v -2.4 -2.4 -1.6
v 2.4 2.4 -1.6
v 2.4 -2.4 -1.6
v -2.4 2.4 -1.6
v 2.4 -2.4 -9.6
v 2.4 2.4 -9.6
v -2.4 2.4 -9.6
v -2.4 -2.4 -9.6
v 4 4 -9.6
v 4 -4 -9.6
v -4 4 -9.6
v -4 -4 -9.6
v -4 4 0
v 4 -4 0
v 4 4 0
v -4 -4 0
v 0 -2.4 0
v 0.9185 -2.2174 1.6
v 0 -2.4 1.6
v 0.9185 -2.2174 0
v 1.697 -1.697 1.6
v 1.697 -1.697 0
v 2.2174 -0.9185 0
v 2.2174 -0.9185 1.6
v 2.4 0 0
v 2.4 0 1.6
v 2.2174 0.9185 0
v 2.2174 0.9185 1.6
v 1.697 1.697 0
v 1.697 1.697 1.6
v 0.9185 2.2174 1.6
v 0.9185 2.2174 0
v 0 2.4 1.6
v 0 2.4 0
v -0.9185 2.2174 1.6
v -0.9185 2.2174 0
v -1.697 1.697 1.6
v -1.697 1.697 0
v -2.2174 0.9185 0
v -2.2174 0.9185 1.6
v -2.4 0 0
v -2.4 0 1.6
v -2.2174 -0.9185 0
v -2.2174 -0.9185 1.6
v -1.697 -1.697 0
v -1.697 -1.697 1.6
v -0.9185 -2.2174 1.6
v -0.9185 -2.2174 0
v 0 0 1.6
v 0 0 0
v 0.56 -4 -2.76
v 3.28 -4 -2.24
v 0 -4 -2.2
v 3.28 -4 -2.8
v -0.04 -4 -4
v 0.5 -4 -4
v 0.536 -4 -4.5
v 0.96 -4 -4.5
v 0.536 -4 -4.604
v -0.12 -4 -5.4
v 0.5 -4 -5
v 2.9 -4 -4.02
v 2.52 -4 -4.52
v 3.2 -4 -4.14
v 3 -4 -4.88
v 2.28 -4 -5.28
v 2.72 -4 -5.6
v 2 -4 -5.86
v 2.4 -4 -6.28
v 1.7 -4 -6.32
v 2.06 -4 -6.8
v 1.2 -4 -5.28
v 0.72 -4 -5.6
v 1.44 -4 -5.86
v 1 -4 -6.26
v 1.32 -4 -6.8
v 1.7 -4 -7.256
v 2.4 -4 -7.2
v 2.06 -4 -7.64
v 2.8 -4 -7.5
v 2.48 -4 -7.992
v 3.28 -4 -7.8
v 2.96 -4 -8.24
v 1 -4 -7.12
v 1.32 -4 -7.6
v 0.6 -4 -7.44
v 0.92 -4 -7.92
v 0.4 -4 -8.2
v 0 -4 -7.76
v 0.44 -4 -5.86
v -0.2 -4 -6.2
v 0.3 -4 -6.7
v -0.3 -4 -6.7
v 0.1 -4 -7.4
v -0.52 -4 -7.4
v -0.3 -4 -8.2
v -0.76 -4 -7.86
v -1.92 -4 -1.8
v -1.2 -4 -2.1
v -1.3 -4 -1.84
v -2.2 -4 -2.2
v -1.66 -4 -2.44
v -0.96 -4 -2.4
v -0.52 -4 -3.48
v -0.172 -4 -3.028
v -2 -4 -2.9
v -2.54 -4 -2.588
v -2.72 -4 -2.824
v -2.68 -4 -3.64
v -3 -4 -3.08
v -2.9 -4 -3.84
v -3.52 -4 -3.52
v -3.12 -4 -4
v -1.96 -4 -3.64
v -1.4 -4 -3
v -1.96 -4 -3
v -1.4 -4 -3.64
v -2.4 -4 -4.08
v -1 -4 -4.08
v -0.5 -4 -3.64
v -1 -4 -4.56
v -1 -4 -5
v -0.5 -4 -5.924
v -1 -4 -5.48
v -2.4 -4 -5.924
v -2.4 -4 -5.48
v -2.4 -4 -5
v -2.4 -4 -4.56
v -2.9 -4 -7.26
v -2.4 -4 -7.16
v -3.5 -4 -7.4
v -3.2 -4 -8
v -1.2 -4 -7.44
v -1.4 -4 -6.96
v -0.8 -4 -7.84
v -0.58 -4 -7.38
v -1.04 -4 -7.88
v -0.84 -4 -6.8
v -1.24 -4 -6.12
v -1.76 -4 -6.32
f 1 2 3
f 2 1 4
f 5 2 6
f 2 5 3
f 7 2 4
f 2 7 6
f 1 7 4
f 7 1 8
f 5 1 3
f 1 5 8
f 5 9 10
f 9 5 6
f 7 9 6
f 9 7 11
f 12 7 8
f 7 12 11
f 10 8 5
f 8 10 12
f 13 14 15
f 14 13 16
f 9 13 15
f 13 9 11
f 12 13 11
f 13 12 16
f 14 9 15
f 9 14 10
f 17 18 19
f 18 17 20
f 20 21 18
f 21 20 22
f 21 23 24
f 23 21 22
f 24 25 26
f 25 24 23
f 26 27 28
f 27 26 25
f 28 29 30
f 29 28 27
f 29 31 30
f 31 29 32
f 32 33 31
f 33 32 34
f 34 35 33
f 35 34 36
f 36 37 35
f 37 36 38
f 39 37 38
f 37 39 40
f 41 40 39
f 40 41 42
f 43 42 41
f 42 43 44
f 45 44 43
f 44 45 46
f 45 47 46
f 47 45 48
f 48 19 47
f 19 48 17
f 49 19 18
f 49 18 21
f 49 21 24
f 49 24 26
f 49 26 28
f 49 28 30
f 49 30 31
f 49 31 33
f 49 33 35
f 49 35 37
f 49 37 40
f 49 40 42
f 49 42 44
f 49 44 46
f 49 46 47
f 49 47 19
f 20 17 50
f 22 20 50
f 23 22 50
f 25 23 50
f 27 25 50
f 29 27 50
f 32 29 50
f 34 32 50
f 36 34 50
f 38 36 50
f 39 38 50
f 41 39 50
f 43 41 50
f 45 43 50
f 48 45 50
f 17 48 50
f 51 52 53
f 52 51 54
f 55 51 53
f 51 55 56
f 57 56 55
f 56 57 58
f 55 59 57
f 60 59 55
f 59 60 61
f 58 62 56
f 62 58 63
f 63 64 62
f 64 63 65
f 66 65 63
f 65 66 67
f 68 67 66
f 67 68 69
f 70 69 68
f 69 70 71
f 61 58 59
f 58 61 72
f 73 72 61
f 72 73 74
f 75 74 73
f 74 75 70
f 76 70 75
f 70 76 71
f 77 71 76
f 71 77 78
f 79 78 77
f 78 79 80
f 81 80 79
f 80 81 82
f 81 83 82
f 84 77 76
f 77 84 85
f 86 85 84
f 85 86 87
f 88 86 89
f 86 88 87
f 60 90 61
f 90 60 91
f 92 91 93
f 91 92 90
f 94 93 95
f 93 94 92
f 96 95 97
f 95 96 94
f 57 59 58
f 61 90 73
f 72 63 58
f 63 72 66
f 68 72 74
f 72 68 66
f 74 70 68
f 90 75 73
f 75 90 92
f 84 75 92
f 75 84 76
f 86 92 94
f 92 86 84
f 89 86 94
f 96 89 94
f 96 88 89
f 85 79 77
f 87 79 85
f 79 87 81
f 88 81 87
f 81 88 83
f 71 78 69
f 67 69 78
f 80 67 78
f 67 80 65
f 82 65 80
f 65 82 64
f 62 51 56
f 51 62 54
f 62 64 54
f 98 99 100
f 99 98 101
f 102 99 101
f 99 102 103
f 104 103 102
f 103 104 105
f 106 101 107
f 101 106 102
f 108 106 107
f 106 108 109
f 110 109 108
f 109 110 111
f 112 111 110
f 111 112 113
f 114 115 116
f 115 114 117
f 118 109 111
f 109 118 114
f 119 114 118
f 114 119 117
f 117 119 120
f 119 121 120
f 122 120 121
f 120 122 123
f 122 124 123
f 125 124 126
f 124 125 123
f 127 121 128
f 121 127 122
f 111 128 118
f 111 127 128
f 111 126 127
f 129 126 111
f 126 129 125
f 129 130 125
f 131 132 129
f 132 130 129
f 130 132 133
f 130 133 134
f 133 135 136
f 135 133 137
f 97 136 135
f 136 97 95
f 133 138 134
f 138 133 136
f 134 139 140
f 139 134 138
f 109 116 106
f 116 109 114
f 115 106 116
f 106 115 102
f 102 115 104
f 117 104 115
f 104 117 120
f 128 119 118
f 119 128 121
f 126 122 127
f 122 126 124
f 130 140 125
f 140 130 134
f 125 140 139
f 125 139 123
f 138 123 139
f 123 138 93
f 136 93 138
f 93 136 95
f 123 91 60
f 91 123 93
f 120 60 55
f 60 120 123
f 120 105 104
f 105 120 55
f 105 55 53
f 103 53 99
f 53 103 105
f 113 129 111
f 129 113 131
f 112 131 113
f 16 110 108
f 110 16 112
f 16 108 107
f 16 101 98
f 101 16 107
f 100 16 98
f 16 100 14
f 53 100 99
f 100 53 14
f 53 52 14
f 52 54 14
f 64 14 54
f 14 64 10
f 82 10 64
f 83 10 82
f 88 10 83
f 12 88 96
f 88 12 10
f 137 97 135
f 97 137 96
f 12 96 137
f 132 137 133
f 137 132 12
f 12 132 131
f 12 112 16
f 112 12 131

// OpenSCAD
// file: ../p/4-4edge.scad
use <../lib.scad>
function ldraw_lib__4_4edge() = [
// 0 Circle 1.0
// 0 Name: 4-4edge.dat
// 0 Author: James Jessiman
// 0 !LDRAW_ORG Primitive UPDATE 2017-01
// 0 !LICENSE Licensed under CC BY 2.0 and CC BY 4.0 : see CAreadme.txt
// 
// 0 BFC CERTIFY CCW
  [0,"BFC","CERTIFY"],
  [0,"BFC","CCW"],
// 
// 0 !HISTORY 1998-12-15 [PTadmin] Official Update 1998-10
// 0 !HISTORY 2005-12-28 [PTadmin] Official Update 2005-01
// 0 !HISTORY 2007-06-24 [PTadmin] Header formatted for Contributor Agreement
// 0 !HISTORY 2008-07-01 [PTadmin] Official Update 2008-01
// 0 !HISTORY 2017-01-15 [Steffen] BFCed
// 0 !HISTORY 2017-12-30 [PTadmin] Official Update 2017-01
// 
// 
// 2 24 1 0 0 0.9239 0 0.3827
  [2,24,1,0,0,0.9239,0,0.3827],
// 2 24 0.9239 0 0.3827 0.7071 0 0.7071
  [2,24,0.9239,0,0.3827,0.7071,0,0.7071],
// 2 24 0.7071 0 0.7071 0.3827 0 0.9239
  [2,24,0.7071,0,0.7071,0.3827,0,0.9239],
// 2 24 0.3827 0 0.9239 0 0 1
  [2,24,0.3827,0,0.9239,0,0,1],
// 2 24 0 0 1 -0.3827 0 0.9239
  [2,24,0,0,1,-0.3827,0,0.9239],
// 2 24 -0.3827 0 0.9239 -0.7071 0 0.7071
  [2,24,-0.3827,0,0.9239,-0.7071,0,0.7071],
// 2 24 -0.7071 0 0.7071 -0.9239 0 0.3827
  [2,24,-0.7071,0,0.7071,-0.9239,0,0.3827],
// 2 24 -0.9239 0 0.3827 -1 0 -0
  [2,24,-0.9239,0,0.3827,-1,0,-0],
// 2 24 -1 0 -0 -0.9239 0 -0.3827
  [2,24,-1,0,-0,-0.9239,0,-0.3827],
// 2 24 -0.9239 0 -0.3827 -0.7071 0 -0.7071
  [2,24,-0.9239,0,-0.3827,-0.7071,0,-0.7071],
// 2 24 -0.7071 0 -0.7071 -0.3827 0 -0.9239
  [2,24,-0.7071,0,-0.7071,-0.3827,0,-0.9239],
// 2 24 -0.3827 0 -0.9239 0 0 -1
  [2,24,-0.3827,0,-0.9239,0,0,-1],
// 2 24 0 0 -1 0.3827 0 -0.9239
  [2,24,0,0,-1,0.3827,0,-0.9239],
// 2 24 0.3827 0 -0.9239 0.7071 0 -0.7071
  [2,24,0.3827,0,-0.9239,0.7071,0,-0.7071],
// 2 24 0.7071 0 -0.7071 0.9239 0 -0.3827
  [2,24,0.7071,0,-0.7071,0.9239,0,-0.3827],
// 2 24 0.9239 0 -0.3827 1 0 0
  [2,24,0.9239,0,-0.3827,1,0,0],
];
module ldraw_lib__4_4edge(step=0, col=false, unit=2/5, alt=false, line=0.2, solid=!$preview)
    makepoly(ldraw_lib__4_4edge(), step=step, col=col, unit=unit, alt=alt, line=line, solid=solid);
ldraw_lib__4_4edge(line=0.2);
// file: ../p/4-4disc.scad
use <../lib.scad>
function ldraw_lib__4_4disc() = [
// 0 Disc 1.0
// 0 Name: 4-4disc.dat
// 0 Author: James Jessiman
// 0 !LDRAW_ORG Primitive UPDATE 2002-02
// 0 !LICENSE Licensed under CC BY 2.0 and CC BY 4.0 : see CAreadme.txt
// 
// 0 BFC CERTIFY CCW
  [0,"BFC","CERTIFY"],
  [0,"BFC","CCW"],
// 
// 0 !HISTORY 1998-12-15 [PTadmin] Official Update 1998-10
// 0 !HISTORY 2002-03-23 [sbliss] Added BFC statement
// 0 !HISTORY 2002-04-25 [PTadmin] Official Update 2002-02
// 0 !HISTORY 2007-06-24 [PTadmin] Header formatted for Contributor Agreement
// 0 !HISTORY 2008-07-01 [PTadmin] Official Update 2008-01
// 
// 
// 3 16 0 0 0 1 0 0 0.9239 0 0.3827
  [3,16,0,0,0,1,0,0,0.9239,0,0.3827],
// 3 16 0 0 0 0.9239 0 0.3827 0.7071 0 0.7071
  [3,16,0,0,0,0.9239,0,0.3827,0.7071,0,0.7071],
// 3 16 0 0 0 0.7071 0 0.7071 0.3827 0 0.9239
  [3,16,0,0,0,0.7071,0,0.7071,0.3827,0,0.9239],
// 3 16 0 0 0 0.3827 0 0.9239 0 0 1
  [3,16,0,0,0,0.3827,0,0.9239,0,0,1],
// 3 16 0 0 0 0 0 1 -0.3827 0 0.9239
  [3,16,0,0,0,0,0,1,-0.3827,0,0.9239],
// 3 16 0 0 0 -0.3827 0 0.9239 -0.7071 0 0.7071
  [3,16,0,0,0,-0.3827,0,0.9239,-0.7071,0,0.7071],
// 3 16 0 0 0 -0.7071 0 0.7071 -0.9239 0 0.3827
  [3,16,0,0,0,-0.7071,0,0.7071,-0.9239,0,0.3827],
// 3 16 0 0 0 -0.9239 0 0.3827 -1 0 -0
  [3,16,0,0,0,-0.9239,0,0.3827,-1,0,-0],
// 3 16 0 0 0 -1 0 -0 -0.9239 0 -0.3827
  [3,16,0,0,0,-1,0,-0,-0.9239,0,-0.3827],
// 3 16 0 0 0 -0.9239 0 -0.3827 -0.7071 0 -0.7071
  [3,16,0,0,0,-0.9239,0,-0.3827,-0.7071,0,-0.7071],
// 3 16 0 0 0 -0.7071 0 -0.7071 -0.3827 0 -0.9239
  [3,16,0,0,0,-0.7071,0,-0.7071,-0.3827,0,-0.9239],
// 3 16 0 0 0 -0.3827 0 -0.9239 0 0 -1
  [3,16,0,0,0,-0.3827,0,-0.9239,0,0,-1],
// 3 16 0 0 0 0 0 -1 0.3827 0 -0.9239
  [3,16,0,0,0,0,0,-1,0.3827,0,-0.9239],
// 3 16 0 0 0 0.3827 0 -0.9239 0.7071 0 -0.7071
  [3,16,0,0,0,0.3827,0,-0.9239,0.7071,0,-0.7071],
// 3 16 0 0 0 0.7071 0 -0.7071 0.9239 0 -0.3827
  [3,16,0,0,0,0.7071,0,-0.7071,0.9239,0,-0.3827],
// 3 16 0 0 0 0.9239 0 -0.3827 1 0 0
  [3,16,0,0,0,0.9239,0,-0.3827,1,0,0],
// 0
];
module ldraw_lib__4_4disc(step=0, col=false, unit=2/5, alt=false, line=0.2, solid=!$preview)
    makepoly(ldraw_lib__4_4disc(), step=step, col=col, unit=unit, alt=alt, line=line, solid=solid);
ldraw_lib__4_4disc(line=0.2);
// file: ../p/4-4cyli.scad
use <../lib.scad>
$fa=1; $fs=0.2;
function ldraw_lib__4_4cyli(realsolid=false) = [
// 0 Cylinder 1.0
// 0 Name: 4-4cyli.dat
// 0 Author: James Jessiman
// 0 !LDRAW_ORG Primitive UPDATE 2005-01
// 0 !LICENSE Licensed under CC BY 2.0 and CC BY 4.0 : see CAreadme.txt
// 
// 0 BFC CERTIFY CCW
  [0,"BFC","CERTIFY"],
  [0,"BFC","CCW"],
// 
// 0 !HISTORY 1998-12-15 [PTadmin] Official Update 1998-10
// 0 !HISTORY 2002-03-23 [sbliss] Added BFC statement; merged headers from files in distributions LDraw 0.27 and Complete.
// 0 !HISTORY 2002-04-25 [PTadmin] Official Update 2002-02
// 0 !HISTORY 2004-12-14 [guyvivan] BFC CCW
// 0 !HISTORY 2005-12-28 [PTadmin] Official Update 2005-01
// 0 !HISTORY 2007-06-24 [PTadmin] Header formatted for Contributor Agreement
// 0 !HISTORY 2008-07-01 [PTadmin] Official Update 2008-01
// 
// 
// 4 16 1 1 0 0.9239 1 0.3827 0.9239 0 0.3827 1 0 0
  [4,16,1,1,0,0.9239,1,0.3827,0.9239,0,0.3827,1,0,0],
// 5 24 1 0 0 1 1 0 0.9239 0 0.3827 0.9239 0 -0.3827
  [5,24,1,0,0,1,1,0,0.9239,0,0.3827,0.9239,0,-0.3827],
// 4 16 0.9239 1 0.3827 0.7071 1 0.7071 0.7071 0 0.7071 0.9239 0 0.3827
  [4,16,0.9239,1,0.3827,0.7071,1,0.7071,0.7071,0,0.7071,0.9239,0,0.3827],
// 5 24 0.9239 0 0.3827 0.9239 1 0.3827 0.7071 0 0.7071 1 0 0
  [5,24,0.9239,0,0.3827,0.9239,1,0.3827,0.7071,0,0.7071,1,0,0],
// 4 16 0.7071 1 0.7071 0.3827 1 0.9239 0.3827 0 0.9239 0.7071 0 0.7071
  [4,16,0.7071,1,0.7071,0.3827,1,0.9239,0.3827,0,0.9239,0.7071,0,0.7071],
// 5 24 0.7071 0 0.7071 0.7071 1 0.7071 0.3827 0 0.9239 0.9239 0 0.3827
  [5,24,0.7071,0,0.7071,0.7071,1,0.7071,0.3827,0,0.9239,0.9239,0,0.3827],
// 4 16 0.3827 1 0.9239 0 1 1 0 0 1 0.3827 0 0.9239
  [4,16,0.3827,1,0.9239,0,1,1,0,0,1,0.3827,0,0.9239],
// 5 24 0.3827 0 0.9239 0.3827 1 0.9239 0 0 1 0.7071 0 0.7071
  [5,24,0.3827,0,0.9239,0.3827,1,0.9239,0,0,1,0.7071,0,0.7071],
// 4 16 0 1 1 -0.3827 1 0.9239 -0.3827 0 0.9239 0 0 1
  [4,16,0,1,1,-0.3827,1,0.9239,-0.3827,0,0.9239,0,0,1],
// 5 24 0 0 1 0 1 1 -0.3827 0 0.9239 0.3827 0 0.9239
  [5,24,0,0,1,0,1,1,-0.3827,0,0.9239,0.3827,0,0.9239],
// 4 16 -0.3827 1 0.9239 -0.7071 1 0.7071 -0.7071 0 0.7071 -0.3827 0 0.9239
  [4,16,-0.3827,1,0.9239,-0.7071,1,0.7071,-0.7071,0,0.7071,-0.3827,0,0.9239],
// 5 24 -0.3827 0 0.9239 -0.3827 1 0.9239 -0.7071 0 0.7071 0 0 1
  [5,24,-0.3827,0,0.9239,-0.3827,1,0.9239,-0.7071,0,0.7071,0,0,1],
// 4 16 -0.7071 1 0.7071 -0.9239 1 0.3827 -0.9239 0 0.3827 -0.7071 0 0.7071
  [4,16,-0.7071,1,0.7071,-0.9239,1,0.3827,-0.9239,0,0.3827,-0.7071,0,0.7071],
// 5 24 -0.7071 0 0.7071 -0.7071 1 0.7071 -0.9239 0 0.3827 -0.3827 0 0.9239
  [5,24,-0.7071,0,0.7071,-0.7071,1,0.7071,-0.9239,0,0.3827,-0.3827,0,0.9239],
// 4 16 -0.9239 1 0.3827 -1 1 0 -1 0 0 -0.9239 0 0.3827
  [4,16,-0.9239,1,0.3827,-1,1,0,-1,0,0,-0.9239,0,0.3827],
// 5 24 -0.9239 0 0.3827 -0.9239 1 0.3827 -1 0 0 -0.7071 0 0.7071
  [5,24,-0.9239,0,0.3827,-0.9239,1,0.3827,-1,0,0,-0.7071,0,0.7071],
// 4 16 -1 1 0 -0.9239 1 -0.3827 -0.9239 0 -0.3827 -1 0 0
  [4,16,-1,1,0,-0.9239,1,-0.3827,-0.9239,0,-0.3827,-1,0,0],
// 5 24 -1 0 0 -1 1 0 -0.9239 0 -0.3827 -0.9239 0 0.3827
  [5,24,-1,0,0,-1,1,0,-0.9239,0,-0.3827,-0.9239,0,0.3827],
// 4 16 -0.9239 1 -0.3827 -0.7071 1 -0.7071 -0.7071 0 -0.7071 -0.9239 0 -0.3827
  [4,16,-0.9239,1,-0.3827,-0.7071,1,-0.7071,-0.7071,0,-0.7071,-0.9239,0,-0.3827],
// 5 24 -0.9239 0 -0.3827 -0.9239 1 -0.3827 -0.7071 0 -0.7071 -1 0 0
  [5,24,-0.9239,0,-0.3827,-0.9239,1,-0.3827,-0.7071,0,-0.7071,-1,0,0],
// 4 16 -0.7071 1 -0.7071 -0.3827 1 -0.9239 -0.3827 0 -0.9239 -0.7071 0 -0.7071
  [4,16,-0.7071,1,-0.7071,-0.3827,1,-0.9239,-0.3827,0,-0.9239,-0.7071,0,-0.7071],
// 5 24 -0.7071 0 -0.7071 -0.7071 1 -0.7071 -0.3827 0 -0.9239 -0.9239 0 -0.3827
  [5,24,-0.7071,0,-0.7071,-0.7071,1,-0.7071,-0.3827,0,-0.9239,-0.9239,0,-0.3827],
// 4 16 -0.3827 1 -0.9239 0 1 -1 0 0 -1 -0.3827 0 -0.9239
  [4,16,-0.3827,1,-0.9239,0,1,-1,0,0,-1,-0.3827,0,-0.9239],
// 5 24 -0.3827 0 -0.9239 -0.3827 1 -0.9239 0 0 -1 -0.7071 0 -0.7071
  [5,24,-0.3827,0,-0.9239,-0.3827,1,-0.9239,0,0,-1,-0.7071,0,-0.7071],
// 4 16 0 1 -1 0.3827 1 -0.9239 0.3827 0 -0.9239 0 0 -1
  [4,16,0,1,-1,0.3827,1,-0.9239,0.3827,0,-0.9239,0,0,-1],
// 5 24 0 0 -1 0 1 -1 0.3827 0 -0.9239 -0.3827 0 -0.9239
  [5,24,0,0,-1,0,1,-1,0.3827,0,-0.9239,-0.3827,0,-0.9239],
// 4 16 0.3827 1 -0.9239 0.7071 1 -0.7071 0.7071 0 -0.7071 0.3827 0 -0.9239
  [4,16,0.3827,1,-0.9239,0.7071,1,-0.7071,0.7071,0,-0.7071,0.3827,0,-0.9239],
// 5 24 0.3827 0 -0.9239 0.3827 1 -0.9239 0.7071 0 -0.7071 0 0 -1
  [5,24,0.3827,0,-0.9239,0.3827,1,-0.9239,0.7071,0,-0.7071,0,0,-1],
// 4 16 0.7071 1 -0.7071 0.9239 1 -0.3827 0.9239 0 -0.3827 0.7071 0 -0.7071
  [4,16,0.7071,1,-0.7071,0.9239,1,-0.3827,0.9239,0,-0.3827,0.7071,0,-0.7071],
// 5 24 0.7071 0 -0.7071 0.7071 1 -0.7071 0.9239 0 -0.3827 0.3827 0 -0.9239
  [5,24,0.7071,0,-0.7071,0.7071,1,-0.7071,0.9239,0,-0.3827,0.3827,0,-0.9239],
// 4 16 0.9239 1 -0.3827 1 1 0 1 0 0 0.9239 0 -0.3827
  [4,16,0.9239,1,-0.3827,1,1,0,1,0,0,0.9239,0,-0.3827],
// 5 24 0.9239 0 -0.3827 0.9239 1 -0.3827 1 0 0 0.7071 0 -0.7071
  [5,24,0.9239,0,-0.3827,0.9239,1,-0.3827,1,0,0,0.7071,0,-0.7071],
// 0
];
module ldraw_lib__4_4cyli(step=0, col=false, unit=2/5, alt=false, line=0.2, solid=!$preview)
    makepoly(ldraw_lib__4_4cyli(solid), step=step, col=col, unit=unit, alt=alt, line=line, solid=solid);
ldraw_lib__4_4cyli(line=0.2);
// file: ../p/stud.scad
use <../lib.scad>
use <4-4cyli.scad>
use <4-4disc.scad>
use <4-4edge.scad>
function ldraw_lib__stud() = [
// 0 Stud
// 0 Name: stud.dat
// 0 Author: James Jessiman
// 0 !LDRAW_ORG Primitive UPDATE 2012-01
// 0 !LICENSE Licensed under CC BY 4.0 : see CAreadme.txt
// 
// 0 BFC CERTIFY CCW
  [0,"BFC","CERTIFY"],
  [0,"BFC","CCW"],
// 
// 0 !HISTORY 2002-04-04 [sbliss] Modified for BFC compliance
// 0 !HISTORY 2002-04-25 [PTadmin] Official Update 2002-02
// 0 !HISTORY 2007-06-24 [PTadmin] Header formatted for Contributor Agreement
// 0 !HISTORY 2008-07-01 [PTadmin] Official Update 2008-01
// 0 !HISTORY 2012-02-16 [Philo] Changed to CCW
// 0 !HISTORY 2012-03-30 [PTadmin] Official Update 2012-01
// 
// 
// 1 16 0 0 0 6 0 0 0 1 0 0 0 6 4-4edge.dat
  [1,16,0,0,0,6,0,0,0,1,0,0,0,6, ldraw_lib__4_4edge()],
// 1 16 0 -4 0 6 0 0 0 1 0 0 0 6 4-4edge.dat
  [1,16,0,-4,0,6,0,0,0,1,0,0,0,6, ldraw_lib__4_4edge()],
// 1 16 0 0 0 6 0 0 0 -4 0 0 0 6 4-4cyli.dat
  [1,16,0,0,0,6,0,0,0,-4,0,0,0,6, ldraw_lib__4_4cyli()],
// 1 16 0 -4 0 6 0 0 0 1 0 0 0 6 4-4disc.dat
  [1,16,0,-4,0,6,0,0,0,1,0,0,0,6, ldraw_lib__4_4disc()],
  [-1,16,0,0,0,6,0,0,0,-1,0,0,0,6, ldraw_lib__4_4disc()],
];
module ldraw_lib__stud(step=0, col=false, unit=2/5, alt=false, line=0.2, solid=!$preview)
    makepoly(ldraw_lib__stud(), step=step, col=col, unit=unit, alt=alt, line=line, solid=solid);
ldraw_lib__stud(line=0.2);
// file: ../p/box5.scad
use <../lib.scad>
function ldraw_lib__box5() = [
// 0 Box with 5 Faces and All Edges
// 0 Name: box5.dat
// 0 Author: James Jessiman
// 0 !LDRAW_ORG Primitive UPDATE 2012-01
// 0 !LICENSE Licensed under CC BY 2.0 and CC BY 4.0 : see CAreadme.txt
// 
// 0 BFC CERTIFY CCW
  [0,"BFC","CERTIFY"],
  [0,"BFC","CCW"],
// 
// 0 !HISTORY 2002-04-03 [sbliss] Modified for BFC compliance
// 0 !HISTORY 2002-04-25 [PTadmin] Official Update 2002-02
// 0 !HISTORY 2007-06-24 [PTadmin] Header formatted for Contributor Agreement
// 0 !HISTORY 2008-07-01 [PTadmin] Official Update 2008-01
// 0 !HISTORY 2012-02-16 [Philo] Changed to CCW
// 0 !HISTORY 2012-03-30 [PTadmin] Official Update 2012-01
// 
// 
// 2 24 1 1 1 -1 1 1
  [2,24,1,1,1,-1,1,1],
// 2 24 -1 1 1 -1 1 -1
  [2,24,-1,1,1,-1,1,-1],
// 2 24 -1 1 -1 1 1 -1
  [2,24,-1,1,-1,1,1,-1],
// 2 24 1 1 -1 1 1 1
  [2,24,1,1,-1,1,1,1],
// 2 24 1 0 1 -1 0 1
  [2,24,1,0,1,-1,0,1],
// 2 24 -1 0 1 -1 0 -1
  [2,24,-1,0,1,-1,0,-1],
// 2 24 -1 0 -1 1 0 -1
  [2,24,-1,0,-1,1,0,-1],
// 2 24 1 0 -1 1 0 1
  [2,24,1,0,-1,1,0,1],
// 2 24 1 0 1 1 1 1
  [2,24,1,0,1,1,1,1],
// 2 24 -1 0 1 -1 1 1
  [2,24,-1,0,1,-1,1,1],
// 2 24 1 0 -1 1 1 -1
  [2,24,1,0,-1,1,1,-1],
// 2 24 -1 0 -1 -1 1 -1
  [2,24,-1,0,-1,-1,1,-1],
// 4 16 -1 1 1 1 1 1 1 1 -1 -1 1 -1
  [4,16,-1,1,1,1,1,1,1,1,-1,-1,1,-1],
// 4 16 -1 1 1 -1 0 1 1 0 1 1 1 1
  [4,16,-1,1,1,-1,0,1,1,0,1,1,1,1],
// 4 16 -1 1 -1 -1 0 -1 -1 0 1 -1 1 1
  [4,16,-1,1,-1,-1,0,-1,-1,0,1,-1,1,1],
// 4 16 1 1 -1 1 0 -1 -1 0 -1 -1 1 -1
  [4,16,1,1,-1,1,0,-1,-1,0,-1,-1,1,-1],
// 4 16 1 1 1 1 0 1 1 0 -1 1 1 -1
  [4,16,1,1,1,1,0,1,1,0,-1,1,1,-1],
];
makepoly(ldraw_lib__box5(), line=0.2);
// file: ../p/box4t.scad
use <../lib.scad>
function ldraw_lib__box4t() = [
// 0 Box with 4 Adjacent Faces and All Edges
// 0 Name: box4t.dat
// 0 Author: Tore Eriksson [Tore_Eriksson]
// 0 !LDRAW_ORG Primitive UPDATE 2003-02
// 0 !LICENSE Licensed under CC BY 2.0 and CC BY 4.0 : see CAreadme.txt
// 
// 0 BFC CERTIFY CCW
  [0,"BFC","CERTIFY"],
  [0,"BFC","CCW"],
// 
// 0 !HISTORY 1997-09-29 [PTadmin] Official Update 1997-15
// 0 !HISTORY 2002-08-31 [izanette] Modified with WINDZ for BFC compliance
// 0 !HISTORY 2003-08-01 [PTadmin] Official Update 2003-02
// 0 !HISTORY 2007-06-24 [PTadmin] Header formatted for Contributor Agreement
// 0 !HISTORY 2008-07-01 [PTadmin] Official Update 2008-01
// 
// 
// 2 24 1 1 1 -1 1 1
  [2,24,1,1,1,-1,1,1],
// 2 24 -1 1 1 -1 1 -1
  [2,24,-1,1,1,-1,1,-1],
// 2 24 -1 1 -1 1 1 -1
  [2,24,-1,1,-1,1,1,-1],
// 2 24 1 1 -1 1 1 1
  [2,24,1,1,-1,1,1,1],
// 2 24 1 0 1 -1 0 1
  [2,24,1,0,1,-1,0,1],
// 2 24 -1 0 1 -1 0 -1
  [2,24,-1,0,1,-1,0,-1],
// 2 24 -1 0 -1 1 0 -1
  [2,24,-1,0,-1,1,0,-1],
// 2 24 1 0 -1 1 0 1
  [2,24,1,0,-1,1,0,1],
// 2 24 1 0 1 1 1 1
  [2,24,1,0,1,1,1,1],
// 2 24 -1 0 1 -1 1 1
  [2,24,-1,0,1,-1,1,1],
// 2 24 1 0 -1 1 1 -1
  [2,24,1,0,-1,1,1,-1],
// 2 24 -1 0 -1 -1 1 -1
  [2,24,-1,0,-1,-1,1,-1],
// 4 16 1 1 1 1 1 -1 -1 1 -1 -1 1 1
  [4,16,1,1,1,1,1,-1,-1,1,-1,-1,1,1],
// 4 16 1 1 1 -1 1 1 -1 0 1 1 0 1
  [4,16,1,1,1,-1,1,1,-1,0,1,1,0,1],
// 4 16 -1 1 1 -1 1 -1 -1 0 -1 -1 0 1
  [4,16,-1,1,1,-1,1,-1,-1,0,-1,-1,0,1],
// 0 4 16 -1 1 -1 -1 0 -1 1 0 -1 1 1 -1
// 4 16 1 1 -1 1 1 1 1 0 1 1 0 -1
  [4,16,1,1,-1,1,1,1,1,0,1,1,0,-1],
// 0
];
makepoly(ldraw_lib__box4t(), line=0.2);
// file: s/3005s01.scad
use <../../lib.scad>
use <../../p/box4t.scad>
use <../../p/box5.scad>
use <../../p/stud.scad>
function ldraw_lib__s__3005s01() = [
// 0 ~Brick  1 x  1 without Front Face
// 0 Name: s\3005s01.dat
// 0 Author: John Riley [jriley]
// 0 !LDRAW_ORG Subpart UPDATE 2004-01
// 0 !LICENSE Licensed under CC BY 2.0 and CC BY 4.0 : see CAreadme.txt
// 
// 0 BFC CERTIFY CCW
  [0,"BFC","CERTIFY"],
  [0,"BFC","CCW"],
// 
// 0 !HISTORY 2003-09-07 [jriley] BFCed & Subfiled
// 0 !HISTORY 2004-03-02 [PTadmin] Official Update 2004-01
// 0 !HISTORY 2007-08-29 [PTadmin] Header formatted for Contributor Agreement
// 0 !HISTORY 2008-07-01 [PTadmin] Official Update 2008-01
// 
// 
// 0 BFC INVERTNEXT
  [0,"BFC","INVERTNEXT"],
// 1 16 0 24 0 0 0 6 0 -20 0 -6 0 0 box5.dat
  [1,16,0,24,0,0,0,6,0,-20,0,-6,0,0, ldraw_lib__box5()],
// 4 16 10 24 -10 6 24 -6 6 24 6 10 24 10
  [4,16,10,24,-10,6,24,-6,6,24,6,10,24,10],
// 4 16 10 24 10 6 24 6 -6 24 6 -10 24 10
  [4,16,10,24,10,6,24,6,-6,24,6,-10,24,10],
// 4 16 -10 24 10 -6 24 6 -6 24 -6 -10 24 -10
  [4,16,-10,24,10,-6,24,6,-6,24,-6,-10,24,-10],
// 4 16 -10 24 -10 -6 24 -6 6 24 -6 10 24 -10
  [4,16,-10,24,-10,-6,24,-6,6,24,-6,10,24,-10],
// 1 16 0 24 0 10 0 0 0 -24 0 0 0 10 box4t.dat
  [1,16,0,24,0,10,0,0,0,-24,0,0,0,10, ldraw_lib__box4t()],
// 1 16 0 0 0 0 0 1 0 1 0 -1 0 0 stud.dat
  [1,16,0,0,0,0,0,1,0,1,0,-1,0,0, ldraw_lib__stud()],
// 0
];
module ldraw_lib__s__3005s01(step=0, col=false, unit=2/5, alt=false, line=0.2, solid=!$preview)
    makepoly(ldraw_lib__s__3005s01(), step=step, col=col, unit=unit, alt=alt, line=line, solid=solid);
ldraw_lib__s__3005s01(line=0.2);
// main file
use <../lib.scad>
use <s/3005s01.scad>
function ldraw_lib__3005px0() = [
// 0 Brick  1 x  1 with Red 飯 (Chinese Food) Pattern
// 0 Name: 3005px0.dat
// 0 Author: Vincent Messenet [Cheenzo]
// 0 !LDRAW_ORG Part UPDATE 2019-01
// 0 !LICENSE Licensed under CC BY 4.0 : see CAreadme.txt
// 
// 0 BFC CERTIFY CCW
  [0,"BFC","CERTIFY"],
  [0,"BFC","CCW"],
// 
// 0 !KEYWORDS Big Bang Theory, BrickLink 3005pb026, Rebrickable 3005pr0013, Rice
// 0 !KEYWORDS Set 21302
// 
// 0 !HISTORY 2019-06-28 [PTadmin] Official Update 2019-01
// 
// 
// 1 16 0 0 0 1 0 0 0 1 0 0 0 1 s\3005s01.dat
  [1,16,0,0,0,1,0,0,0,1,0,0,0,1, ldraw_lib__s__3005s01()],
// 
// 4 4 0 5.5 -10 1.4 6.9 -10 8.2 7 -10 8.2 5.6 -10
  [4,4,0,5.5,-10,1.4,6.9,-10,8.2,7,-10,8.2,5.6,-10],
// 4 4 0 5.5 -10 -.1 10 -10 1.25 10 -10 1.4 6.9 -10
  [4,4,0,5.5,-10,-.1,10,-10,1.25,10,-10,1.4,6.9,-10],
// 4 4 -.1 10 -10 1.34 11.25 -10 2.4 11.25 -10 1.25 10 -10
  [4,4,-.1,10,-10,1.34,11.25,-10,2.4,11.25,-10,1.25,10,-10],
// 3 4 -.1 10 -10 1.34 11.51 -10 1.34 11.25 -10
  [3,4,-.1,10,-10,1.34,11.51,-10,1.34,11.25,-10],
// 4 4 -.1 10 -10 -.3 13.5 -10 1.25 12.5 -10 1.34 11.51 -10
  [4,4,-.1,10,-10,-.3,13.5,-10,1.25,12.5,-10,1.34,11.51,-10],
// 4 4 1.25 10 -10 2.4 11.25 -10 6.3 11.3 -10 7.25 10.05 -10
  [4,4,1.25,10,-10,2.4,11.25,-10,6.3,11.3,-10,7.25,10.05,-10],
// 4 4 6.3 11.3 -10 7.5 12.2 -10 8 10.35 -10 7.25 10.05 -10
  [4,4,6.3,11.3,-10,7.5,12.2,-10,8,10.35,-10,7.25,10.05,-10],
// 4 4 5.7 13.2 -10 6.8 14 -10 7.5 12.2 -10 6.3 11.3 -10
  [4,4,5.7,13.2,-10,6.8,14,-10,7.5,12.2,-10,6.3,11.3,-10],
// 4 4 5 14.65 -10 6 15.7 -10 6.8 14 -10 5.7 13.2 -10
  [4,4,5,14.65,-10,6,15.7,-10,6.8,14,-10,5.7,13.2,-10],
// 4 4 4.25 15.8 -10 5.15 17 -10 6 15.7 -10 5 14.65 -10
  [4,4,4.25,15.8,-10,5.15,17,-10,6,15.7,-10,5,14.65,-10],
// 4 4 1.25 12.5 -10 3 13.2 -10 2.4 11.25 -10 1.34 11.51 -10
  [4,4,1.25,12.5,-10,3,13.2,-10,2.4,11.25,-10,1.34,11.51,-10],
// 4 4 1.25 12.5 -10 1.8 14 -10 3.6 14.65 -10 3 13.2 -10
  [4,4,1.25,12.5,-10,1.8,14,-10,3.6,14.65,-10,3,13.2,-10],
// 4 4 1.8 14 -10 2.5 15.65 -10 4.25 15.8 -10 3.6 14.65 -10
  [4,4,1.8,14,-10,2.5,15.65,-10,4.25,15.8,-10,3.6,14.65,-10],
// 4 4 2.5 15.65 -10 3.3 17 -10 5.15 17 -10 4.25 15.8 -10
  [4,4,2.5,15.65,-10,3.3,17,-10,5.15,17,-10,4.25,15.8,-10],
// 4 4 3.3 17 -10 4.25 18.14 -10 6 18 -10 5.15 17 -10
  [4,4,3.3,17,-10,4.25,18.14,-10,6,18,-10,5.15,17,-10],
// 4 4 4.25 18.14 -10 5.15 19.1 -10 7 18.75 -10 6 18 -10
  [4,4,4.25,18.14,-10,5.15,19.1,-10,7,18.75,-10,6,18,-10],
// 4 4 5.15 19.1 -10 6.2 19.98 -10 8.2 19.5 -10 7 18.75 -10
  [4,4,5.15,19.1,-10,6.2,19.98,-10,8.2,19.5,-10,7,18.75,-10],
// 3 4 6.2 19.98 -10 7.4 20.6 -10 8.2 19.5 -10
  [3,4,6.2,19.98,-10,7.4,20.6,-10,8.2,19.5,-10],
// 4 4 2.5 17.8 -10 3.3 19 -10 4.25 18.14 -10 3.3 17 -10
  [4,4,2.5,17.8,-10,3.3,19,-10,4.25,18.14,-10,3.3,17,-10],
// 4 4 1.5 18.6 -10 2.3 19.8 -10 3.3 19 -10 2.5 17.8 -10
  [4,4,1.5,18.6,-10,2.3,19.8,-10,3.3,19,-10,2.5,17.8,-10],
// 4 4 0 19.4 -10 1 20.5 -10 2.3 19.8 -10 1.5 18.6 -10
  [4,4,0,19.4,-10,1,20.5,-10,2.3,19.8,-10,1.5,18.6,-10],
// 4 4 -.5 15.5 -10 1.1 14.65 -10 1.25 12.5 -10 -.3 13.5 -10
  [4,4,-.5,15.5,-10,1.1,14.65,-10,1.25,12.5,-10,-.3,13.5,-10],
// 4 4 -.75 16.75 -10 .75 16.75 -10 1.1 14.65 -10 -.5 15.5 -10
  [4,4,-.75,16.75,-10,.75,16.75,-10,1.1,14.65,-10,-.5,15.5,-10],
// 4 4 -1.3 18.5 -10 .25 18.5 -10 .75 16.75 -10 -.75 16.75 -10
  [4,4,-1.3,18.5,-10,.25,18.5,-10,.75,16.75,-10,-.75,16.75,-10],
// 4 4 -1.9 19.65 -10 -.75 20.5 -10 .25 18.5 -10 -1.3 18.5 -10
  [4,4,-1.9,19.65,-10,-.75,20.5,-10,.25,18.5,-10,-1.3,18.5,-10],
// 
// 3 16 1.34 11.25 -10 1.34 11.51 -10 2.4 11.25 -10
  [3,16,1.34,11.25,-10,1.34,11.51,-10,2.4,11.25,-10],
// 3 16 1.25 12.5 -10 1.1 14.65 -10 1.8 14 -10
  [3,16,1.25,12.5,-10,1.1,14.65,-10,1.8,14,-10],
// 4 16 2.4 11.25 -10 3 13.2 -10 5.7 13.2 -10 6.3 11.3 -10
  [4,16,2.4,11.25,-10,3,13.2,-10,5.7,13.2,-10,6.3,11.3,-10],
// 4 16 3 13.2 -10 3.6 14.65 -10 5 14.65 -10 5.7 13.2 -10
  [4,16,3,13.2,-10,3.6,14.65,-10,5,14.65,-10,5.7,13.2,-10],
// 3 16 3.6 14.65 -10 4.25 15.8 -10 5 14.65 -10
  [3,16,3.6,14.65,-10,4.25,15.8,-10,5,14.65,-10],
// 4 16 .75 16.75 -10 2.5 15.65 -10 1.8 14 -10 1.1 14.65 -10
  [4,16,.75,16.75,-10,2.5,15.65,-10,1.8,14,-10,1.1,14.65,-10],
// 4 16 .75 16.75 -10 2.5 17.8 -10 3.3 17 -10 2.5 15.65 -10
  [4,16,.75,16.75,-10,2.5,17.8,-10,3.3,17,-10,2.5,15.65,-10],
// 4 16 .25 18.5 -10 1.5 18.6 -10 2.5 17.8 -10 .75 16.75 -10
  [4,16,.25,18.5,-10,1.5,18.6,-10,2.5,17.8,-10,.75,16.75,-10],
// 3 16 0 19.4 -10 1.5 18.6 -10 .25 18.5 -10
  [3,16,0,19.4,-10,1.5,18.6,-10,.25,18.5,-10],
// 3 16 -.75 20.5 -10 0 19.4 -10 .25 18.5 -10
  [3,16,-.75,20.5,-10,0,19.4,-10,.25,18.5,-10],
// 3 16 -.75 20.5 -10 1 20.5 -10 0 19.4 -10
  [3,16,-.75,20.5,-10,1,20.5,-10,0,19.4,-10],
// 3 16 3.3 19 -10 5.15 19.1 -10 4.25 18.14 -10
  [3,16,3.3,19,-10,5.15,19.1,-10,4.25,18.14,-10],
// 4 16 3.3 19 -10 2.3 19.8 -10 6.2 19.98 -10 5.15 19.1 -10
  [4,16,3.3,19,-10,2.3,19.8,-10,6.2,19.98,-10,5.15,19.1,-10],
// 4 16 2.3 19.8 -10 1 20.5 -10 7.4 20.6 -10 6.2 19.98 -10
  [4,16,2.3,19.8,-10,1,20.5,-10,7.4,20.6,-10,6.2,19.98,-10],
// 3 16 5.15 17 -10 6 18 -10 6 15.7 -10
  [3,16,5.15,17,-10,6,18,-10,6,15.7,-10],
// 3 16 6.8 14 -10 6 15.7 -10 6 18 -10
  [3,16,6.8,14,-10,6,15.7,-10,6,18,-10],
// 4 16 6 18 -10 7 18.75 -10 7.5 12.2 -10 6.8 14 -10
  [4,16,6,18,-10,7,18.75,-10,7.5,12.2,-10,6.8,14,-10],
// 4 16 7.5 12.2 -10 7 18.75 -10 8.2 19.5 -10 8 10.35 -10
  [4,16,7.5,12.2,-10,7,18.75,-10,8.2,19.5,-10,8,10.35,-10],
// 4 16 1.4 6.9 -10 1.25 10 -10 7.25 10.05 -10 8.2 7 -10
  [4,16,1.4,6.9,-10,1.25,10,-10,7.25,10.05,-10,8.2,7,-10],
// 3 16 7.25 10.05 -10 8 10.35 -10 8.2 7 -10
  [3,16,7.25,10.05,-10,8,10.35,-10,8.2,7,-10],
// 
// 4 4 -5.5 5.5 -10 -3 5.25 -10 -3.25 4.6 -10 -4.8 4.5 -10
  [4,4,-5.5,5.5,-10,-3,5.25,-10,-3.25,4.6,-10,-4.8,4.5,-10],
// 4 4 -5.5 5.5 -10 -4.15 6.1 -10 -2.4 6 -10 -3 5.25 -10
  [4,4,-5.5,5.5,-10,-4.15,6.1,-10,-2.4,6,-10,-3,5.25,-10],
// 4 4 -4.15 6.1 -10 -1.3 8.7 -10 -.43 7.57 -10 -2.4 6 -10
  [4,4,-4.15,6.1,-10,-1.3,8.7,-10,-.43,7.57,-10,-2.4,6,-10],
// 4 4 -6.35 6.47 -10 -5 7.25 -10 -4.15 6.1 -10 -5.5 5.5 -10
  [4,4,-6.35,6.47,-10,-5,7.25,-10,-4.15,6.1,-10,-5.5,5.5,-10],
// 4 4 -6.8 7.06 -10 -6.7 9.1 -10 -5 7.25 -10 -6.35 6.47 -10
  [4,4,-6.8,7.06,-10,-6.7,9.1,-10,-5,7.25,-10,-6.35,6.47,-10],
// 4 4 -7.5 7.7 -10 -7.25 9.6 -10 -6.7 9.1 -10 -6.8 7.06 -10
  [4,4,-7.5,7.7,-10,-7.25,9.6,-10,-6.7,9.1,-10,-6.8,7.06,-10],
// 4 4 -8.8 8.8 -10 -7.8 10 -10 -7.25 9.6 -10 -7.5 7.7 -10
  [4,4,-8.8,8.8,-10,-7.8,10,-10,-7.25,9.6,-10,-7.5,7.7,-10],
// 4 4 -4.9 7.5 -10 -4.9 9.1 -10 -3.5 9.1 -10 -3.5 7.5 -10
  [4,4,-4.9,7.5,-10,-4.9,9.1,-10,-3.5,9.1,-10,-3.5,7.5,-10],
// 4 4 -7.25 9.6 -10 -6 10.2 -10 -4.9 9.1 -10 -6.7 9.1 -10
  [4,4,-7.25,9.6,-10,-6,10.2,-10,-4.9,9.1,-10,-6.7,9.1,-10],
// 4 4 -6 10.2 -10 -2.5 10.2 -10 -3.5 9.1 -10 -4.9 9.1 -10
  [4,4,-6,10.2,-10,-2.5,10.2,-10,-3.5,9.1,-10,-4.9,9.1,-10],
// 3 4 -3.5 9.1 -10 -2.5 10.2 -10 -1.25 9.1 -10
  [3,4,-3.5,9.1,-10,-2.5,10.2,-10,-1.25,9.1,-10],
// 3 4 -2.5 10.2 -10 -2.5 11.4 -10 -1.25 9.1 -10
  [3,4,-2.5,10.2,-10,-2.5,11.4,-10,-1.25,9.1,-10],
// 4 4 -2.5 11.4 -10 -2.5 12.5 -10 -1.25 14.81 -10 -1.25 9.1 -10
  [4,4,-2.5,11.4,-10,-2.5,12.5,-10,-1.25,14.81,-10,-1.25,9.1,-10],
// 3 4 -2.5 12.5 -10 -2.5 13.7 -10 -1.25 14.81 -10
  [3,4,-2.5,12.5,-10,-2.5,13.7,-10,-1.25,14.81,-10],
// 4 4 -6 13.7 -10 -6 14.81 -10 -1.25 14.81 -10 -2.5 13.7 -10
  [4,4,-6,13.7,-10,-6,14.81,-10,-1.25,14.81,-10,-2.5,13.7,-10],
// 4 4 -6 11.4 -10 -6 12.5 -10 -2.5 12.5 -10 -2.5 11.4 -10
  [4,4,-6,11.4,-10,-6,12.5,-10,-2.5,12.5,-10,-2.5,11.4,-10],
// 3 4 -7.25 9.6 -10 -6 11.4 -10 -6 10.2 -10
  [3,4,-7.25,9.6,-10,-6,11.4,-10,-6,10.2,-10],
// 3 4 -7.25 9.6 -10 -6 12.5 -10 -6 11.4 -10
  [3,4,-7.25,9.6,-10,-6,12.5,-10,-6,11.4,-10],
// 3 4 -7.25 9.6 -10 -6 13.7 -10 -6 12.5 -10
  [3,4,-7.25,9.6,-10,-6,13.7,-10,-6,12.5,-10],
// 4 4 -7.25 9.6 -10 -7.25 18.15 -10 -6 14.81 -10 -6 13.7 -10
  [4,4,-7.25,9.6,-10,-7.25,18.15,-10,-6,14.81,-10,-6,13.7,-10],
// 3 4 -7.25 18.15 -10 -6 17.9 -10 -6 14.81 -10
  [3,4,-7.25,18.15,-10,-6,17.9,-10,-6,14.81,-10],
// 3 4 -8.75 18.5 -10 -8 20 -10 -7.25 18.15 -10
  [3,4,-8.75,18.5,-10,-8,20,-10,-7.25,18.15,-10],
// 4 4 -8 20 -10 -3 18.6 -10 -6 17.9 -10 -7.25 18.15 -10
  [4,4,-8,20,-10,-3,18.6,-10,-6,17.9,-10,-7.25,18.15,-10],
// 3 4 -6 17.9 -10 -3 18.6 -10 -3.5 17.4 -10
  [3,4,-6,17.9,-10,-3,18.6,-10,-3.5,17.4,-10],
// 4 4 -3 18.6 -10 -2.6 19.7 -10 -2 19.6 -10 -1.45 18.45 -10
  [4,4,-3,18.6,-10,-2.6,19.7,-10,-2,19.6,-10,-1.45,18.45,-10],
// 4 4 -2 19.6 -10 -1.9 19.65 -10 -1.3 18.5 -10 -1.45 18.45 -10
  [4,4,-2,19.6,-10,-1.9,19.65,-10,-1.3,18.5,-10,-1.45,18.45,-10],
// 4 4 -3.5 17.4 -10 -3 18.6 -10 -1.45 18.45 -10 -2.1 17 -10
  [4,4,-3.5,17.4,-10,-3,18.6,-10,-1.45,18.45,-10,-2.1,17,-10],
// 4 4 -4.4 15.8 -10 -3.5 17.4 -10 -2.1 17 -10 -3.1 15.3 -10
  [4,4,-4.4,15.8,-10,-3.5,17.4,-10,-2.1,17,-10,-3.1,15.3,-10],
// 
// 4 16 -6.7 9.1 -10 -4.9 9.1 -10 -4.9 7.5 -10 -5 7.25 -10
  [4,16,-6.7,9.1,-10,-4.9,9.1,-10,-4.9,7.5,-10,-5,7.25,-10],
// 4 16 -5 7.25 -10 -4.9 7.5 -10 -3.5 7.5 -10 -4.15 6.1 -10
  [4,16,-5,7.25,-10,-4.9,7.5,-10,-3.5,7.5,-10,-4.15,6.1,-10],
// 3 16 -4.15 6.1 -10 -3.5 7.5 -10 -1.3 8.7 -10
  [3,16,-4.15,6.1,-10,-3.5,7.5,-10,-1.3,8.7,-10],
// 4 16 -3.5 7.5 -10 -3.5 9.1 -10 -1.25 9.1 -10 -1.3 8.7 -10
  [4,16,-3.5,7.5,-10,-3.5,9.1,-10,-1.25,9.1,-10,-1.3,8.7,-10],
// 4 16 -6 10.2 -10 -6 11.4 -10 -2.5 11.4 -10 -2.5 10.2 -10
  [4,16,-6,10.2,-10,-6,11.4,-10,-2.5,11.4,-10,-2.5,10.2,-10],
// 4 16 -6 12.5 -10 -6 13.7 -10 -2.5 13.7 -10 -2.5 12.5 -10
  [4,16,-6,12.5,-10,-6,13.7,-10,-2.5,13.7,-10,-2.5,12.5,-10],
// 4 16 -6 14.81 -10 -6 17.9 -10 -3.5 17.4 -10 -4.4 15.8 -10
  [4,16,-6,14.81,-10,-6,17.9,-10,-3.5,17.4,-10,-4.4,15.8,-10],
// 3 16 -6 14.81 -10 -4.4 15.8 -10 -3.1 15.3 -10
  [3,16,-6,14.81,-10,-4.4,15.8,-10,-3.1,15.3,-10],
// 3 16 -6 14.81 -10 -3.1 15.3 -10 -1.25 14.81 -10
  [3,16,-6,14.81,-10,-3.1,15.3,-10,-1.25,14.81,-10],
// 4 16 -3.1 15.3 -10 -2.1 17 -10 -.75 16.75 -10 -1.25 14.81 -10
  [4,16,-3.1,15.3,-10,-2.1,17,-10,-.75,16.75,-10,-1.25,14.81,-10],
// 4 16 -2.1 17 -10 -1.45 18.45 -10 -1.3 18.5 -10 -.75 16.75 -10
  [4,16,-2.1,17,-10,-1.45,18.45,-10,-1.3,18.5,-10,-.75,16.75,-10],
// 4 16 -1.25 14.81 -10 -.75 16.75 -10 -.5 15.5 -10 -.3 13.5 -10
  [4,16,-1.25,14.81,-10,-.75,16.75,-10,-.5,15.5,-10,-.3,13.5,-10],
// 4 16 -1.25 9.1 -10 -1.25 14.81 -10 -.3 13.5 -10 -.1 10 -10
  [4,16,-1.25,9.1,-10,-1.25,14.81,-10,-.3,13.5,-10,-.1,10,-10],
// 4 16 -1.3 8.7 -10 -1.25 9.1 -10 -.1 10 -10 -.43 7.57 -10
  [4,16,-1.3,8.7,-10,-1.25,9.1,-10,-.1,10,-10,-.43,7.57,-10],
// 3 16 -.43 7.57 -10 -.1 10 -10 0 5.5 -10
  [3,16,-.43,7.57,-10,-.1,10,-10,0,5.5,-10],
// 4 16 -3 5.25 -10 -2.4 6 -10 -.43 7.57 -10 0 5.5 -10
  [4,16,-3,5.25,-10,-2.4,6,-10,-.43,7.57,-10,0,5.5,-10],
// 4 16 -7.8 10 -10 -8.75 18.5 -10 -7.25 18.15 -10 -7.25 9.6 -10
  [4,16,-7.8,10,-10,-8.75,18.5,-10,-7.25,18.15,-10,-7.25,9.6,-10],
// 3 16 -8.8 8.8 -10 -8.75 18.5 -10 -7.8 10 -10
  [3,16,-8.8,8.8,-10,-8.75,18.5,-10,-7.8,10,-10],
// 
// 4 16 -6.8 7.06 -10 -10 0 -10 -8.8 8.8 -10 -7.5 7.7 -10
  [4,16,-6.8,7.06,-10,-10,0,-10,-8.8,8.8,-10,-7.5,7.7,-10],
// 3 16 -10 0 -10 -6.8 7.06 -10 -6.35 6.47 -10
  [3,16,-10,0,-10,-6.8,7.06,-10,-6.35,6.47,-10],
// 4 16 -4.8 4.5 -10 -10 0 -10 -6.35 6.47 -10 -5.5 5.5 -10
  [4,16,-4.8,4.5,-10,-10,0,-10,-6.35,6.47,-10,-5.5,5.5,-10],
// 4 16 10 0 -10 -10 0 -10 -4.8 4.5 -10 -3.25 4.6 -10
  [4,16,10,0,-10,-10,0,-10,-4.8,4.5,-10,-3.25,4.6,-10],
// 4 16 -3.25 4.6 -10 -3 5.25 -10 0 5.5 -10 10 0 -10
  [4,16,-3.25,4.6,-10,-3,5.25,-10,0,5.5,-10,10,0,-10],
// 3 16 0 5.5 -10 8.2 5.6 -10 10 0 -10
  [3,16,0,5.5,-10,8.2,5.6,-10,10,0,-10],
// 3 16 8.2 5.6 -10 8.2 7 -10 10 0 -10
  [3,16,8.2,5.6,-10,8.2,7,-10,10,0,-10],
// 4 16 8.2 7 -10 8 10.35 -10 10 24 -10 10 0 -10
  [4,16,8.2,7,-10,8,10.35,-10,10,24,-10,10,0,-10],
// 3 16 8.2 19.5 -10 10 24 -10 8 10.35 -10
  [3,16,8.2,19.5,-10,10,24,-10,8,10.35,-10],
// 3 16 7.4 20.6 -10 10 24 -10 8.2 19.5 -10
  [3,16,7.4,20.6,-10,10,24,-10,8.2,19.5,-10],
// 3 16 1 20.5 -10 10 24 -10 7.4 20.6 -10
  [3,16,1,20.5,-10,10,24,-10,7.4,20.6,-10],
// 4 16 -10 24 -10 10 24 -10 1 20.5 -10 -.75 20.5 -10
  [4,16,-10,24,-10,10,24,-10,1,20.5,-10,-.75,20.5,-10],
// 4 16 -2.6 19.7 -10 -.75 20.5 -10 -1.9 19.65 -10 -2 19.6 -10
  [4,16,-2.6,19.7,-10,-.75,20.5,-10,-1.9,19.65,-10,-2,19.6,-10],
// 3 16 -10 24 -10 -.75 20.5 -10 -2.6 19.7 -10
  [3,16,-10,24,-10,-.75,20.5,-10,-2.6,19.7,-10],
// 4 16 -10 24 -10 -2.6 19.7 -10 -3 18.6 -10 -8 20 -10
  [4,16,-10,24,-10,-2.6,19.7,-10,-3,18.6,-10,-8,20,-10],
// 3 16 -10 24 -10 -8 20 -10 -8.75 18.5 -10
  [3,16,-10,24,-10,-8,20,-10,-8.75,18.5,-10],
// 4 16 -10 0 -10 -10 24 -10 -8.75 18.5 -10 -8.8 8.8 -10
  [4,16,-10,0,-10,-10,24,-10,-8.75,18.5,-10,-8.8,8.8,-10],
];
module ldraw_lib__3005px0(step=0, col=false, unit=2/5, alt=false, line=0.2, solid=!$preview)
    makepoly(ldraw_lib__3005px0(), step=step, col=col, unit=unit, alt=alt, line=line, solid=solid);
ldraw_lib__3005px0(line=0.2);
